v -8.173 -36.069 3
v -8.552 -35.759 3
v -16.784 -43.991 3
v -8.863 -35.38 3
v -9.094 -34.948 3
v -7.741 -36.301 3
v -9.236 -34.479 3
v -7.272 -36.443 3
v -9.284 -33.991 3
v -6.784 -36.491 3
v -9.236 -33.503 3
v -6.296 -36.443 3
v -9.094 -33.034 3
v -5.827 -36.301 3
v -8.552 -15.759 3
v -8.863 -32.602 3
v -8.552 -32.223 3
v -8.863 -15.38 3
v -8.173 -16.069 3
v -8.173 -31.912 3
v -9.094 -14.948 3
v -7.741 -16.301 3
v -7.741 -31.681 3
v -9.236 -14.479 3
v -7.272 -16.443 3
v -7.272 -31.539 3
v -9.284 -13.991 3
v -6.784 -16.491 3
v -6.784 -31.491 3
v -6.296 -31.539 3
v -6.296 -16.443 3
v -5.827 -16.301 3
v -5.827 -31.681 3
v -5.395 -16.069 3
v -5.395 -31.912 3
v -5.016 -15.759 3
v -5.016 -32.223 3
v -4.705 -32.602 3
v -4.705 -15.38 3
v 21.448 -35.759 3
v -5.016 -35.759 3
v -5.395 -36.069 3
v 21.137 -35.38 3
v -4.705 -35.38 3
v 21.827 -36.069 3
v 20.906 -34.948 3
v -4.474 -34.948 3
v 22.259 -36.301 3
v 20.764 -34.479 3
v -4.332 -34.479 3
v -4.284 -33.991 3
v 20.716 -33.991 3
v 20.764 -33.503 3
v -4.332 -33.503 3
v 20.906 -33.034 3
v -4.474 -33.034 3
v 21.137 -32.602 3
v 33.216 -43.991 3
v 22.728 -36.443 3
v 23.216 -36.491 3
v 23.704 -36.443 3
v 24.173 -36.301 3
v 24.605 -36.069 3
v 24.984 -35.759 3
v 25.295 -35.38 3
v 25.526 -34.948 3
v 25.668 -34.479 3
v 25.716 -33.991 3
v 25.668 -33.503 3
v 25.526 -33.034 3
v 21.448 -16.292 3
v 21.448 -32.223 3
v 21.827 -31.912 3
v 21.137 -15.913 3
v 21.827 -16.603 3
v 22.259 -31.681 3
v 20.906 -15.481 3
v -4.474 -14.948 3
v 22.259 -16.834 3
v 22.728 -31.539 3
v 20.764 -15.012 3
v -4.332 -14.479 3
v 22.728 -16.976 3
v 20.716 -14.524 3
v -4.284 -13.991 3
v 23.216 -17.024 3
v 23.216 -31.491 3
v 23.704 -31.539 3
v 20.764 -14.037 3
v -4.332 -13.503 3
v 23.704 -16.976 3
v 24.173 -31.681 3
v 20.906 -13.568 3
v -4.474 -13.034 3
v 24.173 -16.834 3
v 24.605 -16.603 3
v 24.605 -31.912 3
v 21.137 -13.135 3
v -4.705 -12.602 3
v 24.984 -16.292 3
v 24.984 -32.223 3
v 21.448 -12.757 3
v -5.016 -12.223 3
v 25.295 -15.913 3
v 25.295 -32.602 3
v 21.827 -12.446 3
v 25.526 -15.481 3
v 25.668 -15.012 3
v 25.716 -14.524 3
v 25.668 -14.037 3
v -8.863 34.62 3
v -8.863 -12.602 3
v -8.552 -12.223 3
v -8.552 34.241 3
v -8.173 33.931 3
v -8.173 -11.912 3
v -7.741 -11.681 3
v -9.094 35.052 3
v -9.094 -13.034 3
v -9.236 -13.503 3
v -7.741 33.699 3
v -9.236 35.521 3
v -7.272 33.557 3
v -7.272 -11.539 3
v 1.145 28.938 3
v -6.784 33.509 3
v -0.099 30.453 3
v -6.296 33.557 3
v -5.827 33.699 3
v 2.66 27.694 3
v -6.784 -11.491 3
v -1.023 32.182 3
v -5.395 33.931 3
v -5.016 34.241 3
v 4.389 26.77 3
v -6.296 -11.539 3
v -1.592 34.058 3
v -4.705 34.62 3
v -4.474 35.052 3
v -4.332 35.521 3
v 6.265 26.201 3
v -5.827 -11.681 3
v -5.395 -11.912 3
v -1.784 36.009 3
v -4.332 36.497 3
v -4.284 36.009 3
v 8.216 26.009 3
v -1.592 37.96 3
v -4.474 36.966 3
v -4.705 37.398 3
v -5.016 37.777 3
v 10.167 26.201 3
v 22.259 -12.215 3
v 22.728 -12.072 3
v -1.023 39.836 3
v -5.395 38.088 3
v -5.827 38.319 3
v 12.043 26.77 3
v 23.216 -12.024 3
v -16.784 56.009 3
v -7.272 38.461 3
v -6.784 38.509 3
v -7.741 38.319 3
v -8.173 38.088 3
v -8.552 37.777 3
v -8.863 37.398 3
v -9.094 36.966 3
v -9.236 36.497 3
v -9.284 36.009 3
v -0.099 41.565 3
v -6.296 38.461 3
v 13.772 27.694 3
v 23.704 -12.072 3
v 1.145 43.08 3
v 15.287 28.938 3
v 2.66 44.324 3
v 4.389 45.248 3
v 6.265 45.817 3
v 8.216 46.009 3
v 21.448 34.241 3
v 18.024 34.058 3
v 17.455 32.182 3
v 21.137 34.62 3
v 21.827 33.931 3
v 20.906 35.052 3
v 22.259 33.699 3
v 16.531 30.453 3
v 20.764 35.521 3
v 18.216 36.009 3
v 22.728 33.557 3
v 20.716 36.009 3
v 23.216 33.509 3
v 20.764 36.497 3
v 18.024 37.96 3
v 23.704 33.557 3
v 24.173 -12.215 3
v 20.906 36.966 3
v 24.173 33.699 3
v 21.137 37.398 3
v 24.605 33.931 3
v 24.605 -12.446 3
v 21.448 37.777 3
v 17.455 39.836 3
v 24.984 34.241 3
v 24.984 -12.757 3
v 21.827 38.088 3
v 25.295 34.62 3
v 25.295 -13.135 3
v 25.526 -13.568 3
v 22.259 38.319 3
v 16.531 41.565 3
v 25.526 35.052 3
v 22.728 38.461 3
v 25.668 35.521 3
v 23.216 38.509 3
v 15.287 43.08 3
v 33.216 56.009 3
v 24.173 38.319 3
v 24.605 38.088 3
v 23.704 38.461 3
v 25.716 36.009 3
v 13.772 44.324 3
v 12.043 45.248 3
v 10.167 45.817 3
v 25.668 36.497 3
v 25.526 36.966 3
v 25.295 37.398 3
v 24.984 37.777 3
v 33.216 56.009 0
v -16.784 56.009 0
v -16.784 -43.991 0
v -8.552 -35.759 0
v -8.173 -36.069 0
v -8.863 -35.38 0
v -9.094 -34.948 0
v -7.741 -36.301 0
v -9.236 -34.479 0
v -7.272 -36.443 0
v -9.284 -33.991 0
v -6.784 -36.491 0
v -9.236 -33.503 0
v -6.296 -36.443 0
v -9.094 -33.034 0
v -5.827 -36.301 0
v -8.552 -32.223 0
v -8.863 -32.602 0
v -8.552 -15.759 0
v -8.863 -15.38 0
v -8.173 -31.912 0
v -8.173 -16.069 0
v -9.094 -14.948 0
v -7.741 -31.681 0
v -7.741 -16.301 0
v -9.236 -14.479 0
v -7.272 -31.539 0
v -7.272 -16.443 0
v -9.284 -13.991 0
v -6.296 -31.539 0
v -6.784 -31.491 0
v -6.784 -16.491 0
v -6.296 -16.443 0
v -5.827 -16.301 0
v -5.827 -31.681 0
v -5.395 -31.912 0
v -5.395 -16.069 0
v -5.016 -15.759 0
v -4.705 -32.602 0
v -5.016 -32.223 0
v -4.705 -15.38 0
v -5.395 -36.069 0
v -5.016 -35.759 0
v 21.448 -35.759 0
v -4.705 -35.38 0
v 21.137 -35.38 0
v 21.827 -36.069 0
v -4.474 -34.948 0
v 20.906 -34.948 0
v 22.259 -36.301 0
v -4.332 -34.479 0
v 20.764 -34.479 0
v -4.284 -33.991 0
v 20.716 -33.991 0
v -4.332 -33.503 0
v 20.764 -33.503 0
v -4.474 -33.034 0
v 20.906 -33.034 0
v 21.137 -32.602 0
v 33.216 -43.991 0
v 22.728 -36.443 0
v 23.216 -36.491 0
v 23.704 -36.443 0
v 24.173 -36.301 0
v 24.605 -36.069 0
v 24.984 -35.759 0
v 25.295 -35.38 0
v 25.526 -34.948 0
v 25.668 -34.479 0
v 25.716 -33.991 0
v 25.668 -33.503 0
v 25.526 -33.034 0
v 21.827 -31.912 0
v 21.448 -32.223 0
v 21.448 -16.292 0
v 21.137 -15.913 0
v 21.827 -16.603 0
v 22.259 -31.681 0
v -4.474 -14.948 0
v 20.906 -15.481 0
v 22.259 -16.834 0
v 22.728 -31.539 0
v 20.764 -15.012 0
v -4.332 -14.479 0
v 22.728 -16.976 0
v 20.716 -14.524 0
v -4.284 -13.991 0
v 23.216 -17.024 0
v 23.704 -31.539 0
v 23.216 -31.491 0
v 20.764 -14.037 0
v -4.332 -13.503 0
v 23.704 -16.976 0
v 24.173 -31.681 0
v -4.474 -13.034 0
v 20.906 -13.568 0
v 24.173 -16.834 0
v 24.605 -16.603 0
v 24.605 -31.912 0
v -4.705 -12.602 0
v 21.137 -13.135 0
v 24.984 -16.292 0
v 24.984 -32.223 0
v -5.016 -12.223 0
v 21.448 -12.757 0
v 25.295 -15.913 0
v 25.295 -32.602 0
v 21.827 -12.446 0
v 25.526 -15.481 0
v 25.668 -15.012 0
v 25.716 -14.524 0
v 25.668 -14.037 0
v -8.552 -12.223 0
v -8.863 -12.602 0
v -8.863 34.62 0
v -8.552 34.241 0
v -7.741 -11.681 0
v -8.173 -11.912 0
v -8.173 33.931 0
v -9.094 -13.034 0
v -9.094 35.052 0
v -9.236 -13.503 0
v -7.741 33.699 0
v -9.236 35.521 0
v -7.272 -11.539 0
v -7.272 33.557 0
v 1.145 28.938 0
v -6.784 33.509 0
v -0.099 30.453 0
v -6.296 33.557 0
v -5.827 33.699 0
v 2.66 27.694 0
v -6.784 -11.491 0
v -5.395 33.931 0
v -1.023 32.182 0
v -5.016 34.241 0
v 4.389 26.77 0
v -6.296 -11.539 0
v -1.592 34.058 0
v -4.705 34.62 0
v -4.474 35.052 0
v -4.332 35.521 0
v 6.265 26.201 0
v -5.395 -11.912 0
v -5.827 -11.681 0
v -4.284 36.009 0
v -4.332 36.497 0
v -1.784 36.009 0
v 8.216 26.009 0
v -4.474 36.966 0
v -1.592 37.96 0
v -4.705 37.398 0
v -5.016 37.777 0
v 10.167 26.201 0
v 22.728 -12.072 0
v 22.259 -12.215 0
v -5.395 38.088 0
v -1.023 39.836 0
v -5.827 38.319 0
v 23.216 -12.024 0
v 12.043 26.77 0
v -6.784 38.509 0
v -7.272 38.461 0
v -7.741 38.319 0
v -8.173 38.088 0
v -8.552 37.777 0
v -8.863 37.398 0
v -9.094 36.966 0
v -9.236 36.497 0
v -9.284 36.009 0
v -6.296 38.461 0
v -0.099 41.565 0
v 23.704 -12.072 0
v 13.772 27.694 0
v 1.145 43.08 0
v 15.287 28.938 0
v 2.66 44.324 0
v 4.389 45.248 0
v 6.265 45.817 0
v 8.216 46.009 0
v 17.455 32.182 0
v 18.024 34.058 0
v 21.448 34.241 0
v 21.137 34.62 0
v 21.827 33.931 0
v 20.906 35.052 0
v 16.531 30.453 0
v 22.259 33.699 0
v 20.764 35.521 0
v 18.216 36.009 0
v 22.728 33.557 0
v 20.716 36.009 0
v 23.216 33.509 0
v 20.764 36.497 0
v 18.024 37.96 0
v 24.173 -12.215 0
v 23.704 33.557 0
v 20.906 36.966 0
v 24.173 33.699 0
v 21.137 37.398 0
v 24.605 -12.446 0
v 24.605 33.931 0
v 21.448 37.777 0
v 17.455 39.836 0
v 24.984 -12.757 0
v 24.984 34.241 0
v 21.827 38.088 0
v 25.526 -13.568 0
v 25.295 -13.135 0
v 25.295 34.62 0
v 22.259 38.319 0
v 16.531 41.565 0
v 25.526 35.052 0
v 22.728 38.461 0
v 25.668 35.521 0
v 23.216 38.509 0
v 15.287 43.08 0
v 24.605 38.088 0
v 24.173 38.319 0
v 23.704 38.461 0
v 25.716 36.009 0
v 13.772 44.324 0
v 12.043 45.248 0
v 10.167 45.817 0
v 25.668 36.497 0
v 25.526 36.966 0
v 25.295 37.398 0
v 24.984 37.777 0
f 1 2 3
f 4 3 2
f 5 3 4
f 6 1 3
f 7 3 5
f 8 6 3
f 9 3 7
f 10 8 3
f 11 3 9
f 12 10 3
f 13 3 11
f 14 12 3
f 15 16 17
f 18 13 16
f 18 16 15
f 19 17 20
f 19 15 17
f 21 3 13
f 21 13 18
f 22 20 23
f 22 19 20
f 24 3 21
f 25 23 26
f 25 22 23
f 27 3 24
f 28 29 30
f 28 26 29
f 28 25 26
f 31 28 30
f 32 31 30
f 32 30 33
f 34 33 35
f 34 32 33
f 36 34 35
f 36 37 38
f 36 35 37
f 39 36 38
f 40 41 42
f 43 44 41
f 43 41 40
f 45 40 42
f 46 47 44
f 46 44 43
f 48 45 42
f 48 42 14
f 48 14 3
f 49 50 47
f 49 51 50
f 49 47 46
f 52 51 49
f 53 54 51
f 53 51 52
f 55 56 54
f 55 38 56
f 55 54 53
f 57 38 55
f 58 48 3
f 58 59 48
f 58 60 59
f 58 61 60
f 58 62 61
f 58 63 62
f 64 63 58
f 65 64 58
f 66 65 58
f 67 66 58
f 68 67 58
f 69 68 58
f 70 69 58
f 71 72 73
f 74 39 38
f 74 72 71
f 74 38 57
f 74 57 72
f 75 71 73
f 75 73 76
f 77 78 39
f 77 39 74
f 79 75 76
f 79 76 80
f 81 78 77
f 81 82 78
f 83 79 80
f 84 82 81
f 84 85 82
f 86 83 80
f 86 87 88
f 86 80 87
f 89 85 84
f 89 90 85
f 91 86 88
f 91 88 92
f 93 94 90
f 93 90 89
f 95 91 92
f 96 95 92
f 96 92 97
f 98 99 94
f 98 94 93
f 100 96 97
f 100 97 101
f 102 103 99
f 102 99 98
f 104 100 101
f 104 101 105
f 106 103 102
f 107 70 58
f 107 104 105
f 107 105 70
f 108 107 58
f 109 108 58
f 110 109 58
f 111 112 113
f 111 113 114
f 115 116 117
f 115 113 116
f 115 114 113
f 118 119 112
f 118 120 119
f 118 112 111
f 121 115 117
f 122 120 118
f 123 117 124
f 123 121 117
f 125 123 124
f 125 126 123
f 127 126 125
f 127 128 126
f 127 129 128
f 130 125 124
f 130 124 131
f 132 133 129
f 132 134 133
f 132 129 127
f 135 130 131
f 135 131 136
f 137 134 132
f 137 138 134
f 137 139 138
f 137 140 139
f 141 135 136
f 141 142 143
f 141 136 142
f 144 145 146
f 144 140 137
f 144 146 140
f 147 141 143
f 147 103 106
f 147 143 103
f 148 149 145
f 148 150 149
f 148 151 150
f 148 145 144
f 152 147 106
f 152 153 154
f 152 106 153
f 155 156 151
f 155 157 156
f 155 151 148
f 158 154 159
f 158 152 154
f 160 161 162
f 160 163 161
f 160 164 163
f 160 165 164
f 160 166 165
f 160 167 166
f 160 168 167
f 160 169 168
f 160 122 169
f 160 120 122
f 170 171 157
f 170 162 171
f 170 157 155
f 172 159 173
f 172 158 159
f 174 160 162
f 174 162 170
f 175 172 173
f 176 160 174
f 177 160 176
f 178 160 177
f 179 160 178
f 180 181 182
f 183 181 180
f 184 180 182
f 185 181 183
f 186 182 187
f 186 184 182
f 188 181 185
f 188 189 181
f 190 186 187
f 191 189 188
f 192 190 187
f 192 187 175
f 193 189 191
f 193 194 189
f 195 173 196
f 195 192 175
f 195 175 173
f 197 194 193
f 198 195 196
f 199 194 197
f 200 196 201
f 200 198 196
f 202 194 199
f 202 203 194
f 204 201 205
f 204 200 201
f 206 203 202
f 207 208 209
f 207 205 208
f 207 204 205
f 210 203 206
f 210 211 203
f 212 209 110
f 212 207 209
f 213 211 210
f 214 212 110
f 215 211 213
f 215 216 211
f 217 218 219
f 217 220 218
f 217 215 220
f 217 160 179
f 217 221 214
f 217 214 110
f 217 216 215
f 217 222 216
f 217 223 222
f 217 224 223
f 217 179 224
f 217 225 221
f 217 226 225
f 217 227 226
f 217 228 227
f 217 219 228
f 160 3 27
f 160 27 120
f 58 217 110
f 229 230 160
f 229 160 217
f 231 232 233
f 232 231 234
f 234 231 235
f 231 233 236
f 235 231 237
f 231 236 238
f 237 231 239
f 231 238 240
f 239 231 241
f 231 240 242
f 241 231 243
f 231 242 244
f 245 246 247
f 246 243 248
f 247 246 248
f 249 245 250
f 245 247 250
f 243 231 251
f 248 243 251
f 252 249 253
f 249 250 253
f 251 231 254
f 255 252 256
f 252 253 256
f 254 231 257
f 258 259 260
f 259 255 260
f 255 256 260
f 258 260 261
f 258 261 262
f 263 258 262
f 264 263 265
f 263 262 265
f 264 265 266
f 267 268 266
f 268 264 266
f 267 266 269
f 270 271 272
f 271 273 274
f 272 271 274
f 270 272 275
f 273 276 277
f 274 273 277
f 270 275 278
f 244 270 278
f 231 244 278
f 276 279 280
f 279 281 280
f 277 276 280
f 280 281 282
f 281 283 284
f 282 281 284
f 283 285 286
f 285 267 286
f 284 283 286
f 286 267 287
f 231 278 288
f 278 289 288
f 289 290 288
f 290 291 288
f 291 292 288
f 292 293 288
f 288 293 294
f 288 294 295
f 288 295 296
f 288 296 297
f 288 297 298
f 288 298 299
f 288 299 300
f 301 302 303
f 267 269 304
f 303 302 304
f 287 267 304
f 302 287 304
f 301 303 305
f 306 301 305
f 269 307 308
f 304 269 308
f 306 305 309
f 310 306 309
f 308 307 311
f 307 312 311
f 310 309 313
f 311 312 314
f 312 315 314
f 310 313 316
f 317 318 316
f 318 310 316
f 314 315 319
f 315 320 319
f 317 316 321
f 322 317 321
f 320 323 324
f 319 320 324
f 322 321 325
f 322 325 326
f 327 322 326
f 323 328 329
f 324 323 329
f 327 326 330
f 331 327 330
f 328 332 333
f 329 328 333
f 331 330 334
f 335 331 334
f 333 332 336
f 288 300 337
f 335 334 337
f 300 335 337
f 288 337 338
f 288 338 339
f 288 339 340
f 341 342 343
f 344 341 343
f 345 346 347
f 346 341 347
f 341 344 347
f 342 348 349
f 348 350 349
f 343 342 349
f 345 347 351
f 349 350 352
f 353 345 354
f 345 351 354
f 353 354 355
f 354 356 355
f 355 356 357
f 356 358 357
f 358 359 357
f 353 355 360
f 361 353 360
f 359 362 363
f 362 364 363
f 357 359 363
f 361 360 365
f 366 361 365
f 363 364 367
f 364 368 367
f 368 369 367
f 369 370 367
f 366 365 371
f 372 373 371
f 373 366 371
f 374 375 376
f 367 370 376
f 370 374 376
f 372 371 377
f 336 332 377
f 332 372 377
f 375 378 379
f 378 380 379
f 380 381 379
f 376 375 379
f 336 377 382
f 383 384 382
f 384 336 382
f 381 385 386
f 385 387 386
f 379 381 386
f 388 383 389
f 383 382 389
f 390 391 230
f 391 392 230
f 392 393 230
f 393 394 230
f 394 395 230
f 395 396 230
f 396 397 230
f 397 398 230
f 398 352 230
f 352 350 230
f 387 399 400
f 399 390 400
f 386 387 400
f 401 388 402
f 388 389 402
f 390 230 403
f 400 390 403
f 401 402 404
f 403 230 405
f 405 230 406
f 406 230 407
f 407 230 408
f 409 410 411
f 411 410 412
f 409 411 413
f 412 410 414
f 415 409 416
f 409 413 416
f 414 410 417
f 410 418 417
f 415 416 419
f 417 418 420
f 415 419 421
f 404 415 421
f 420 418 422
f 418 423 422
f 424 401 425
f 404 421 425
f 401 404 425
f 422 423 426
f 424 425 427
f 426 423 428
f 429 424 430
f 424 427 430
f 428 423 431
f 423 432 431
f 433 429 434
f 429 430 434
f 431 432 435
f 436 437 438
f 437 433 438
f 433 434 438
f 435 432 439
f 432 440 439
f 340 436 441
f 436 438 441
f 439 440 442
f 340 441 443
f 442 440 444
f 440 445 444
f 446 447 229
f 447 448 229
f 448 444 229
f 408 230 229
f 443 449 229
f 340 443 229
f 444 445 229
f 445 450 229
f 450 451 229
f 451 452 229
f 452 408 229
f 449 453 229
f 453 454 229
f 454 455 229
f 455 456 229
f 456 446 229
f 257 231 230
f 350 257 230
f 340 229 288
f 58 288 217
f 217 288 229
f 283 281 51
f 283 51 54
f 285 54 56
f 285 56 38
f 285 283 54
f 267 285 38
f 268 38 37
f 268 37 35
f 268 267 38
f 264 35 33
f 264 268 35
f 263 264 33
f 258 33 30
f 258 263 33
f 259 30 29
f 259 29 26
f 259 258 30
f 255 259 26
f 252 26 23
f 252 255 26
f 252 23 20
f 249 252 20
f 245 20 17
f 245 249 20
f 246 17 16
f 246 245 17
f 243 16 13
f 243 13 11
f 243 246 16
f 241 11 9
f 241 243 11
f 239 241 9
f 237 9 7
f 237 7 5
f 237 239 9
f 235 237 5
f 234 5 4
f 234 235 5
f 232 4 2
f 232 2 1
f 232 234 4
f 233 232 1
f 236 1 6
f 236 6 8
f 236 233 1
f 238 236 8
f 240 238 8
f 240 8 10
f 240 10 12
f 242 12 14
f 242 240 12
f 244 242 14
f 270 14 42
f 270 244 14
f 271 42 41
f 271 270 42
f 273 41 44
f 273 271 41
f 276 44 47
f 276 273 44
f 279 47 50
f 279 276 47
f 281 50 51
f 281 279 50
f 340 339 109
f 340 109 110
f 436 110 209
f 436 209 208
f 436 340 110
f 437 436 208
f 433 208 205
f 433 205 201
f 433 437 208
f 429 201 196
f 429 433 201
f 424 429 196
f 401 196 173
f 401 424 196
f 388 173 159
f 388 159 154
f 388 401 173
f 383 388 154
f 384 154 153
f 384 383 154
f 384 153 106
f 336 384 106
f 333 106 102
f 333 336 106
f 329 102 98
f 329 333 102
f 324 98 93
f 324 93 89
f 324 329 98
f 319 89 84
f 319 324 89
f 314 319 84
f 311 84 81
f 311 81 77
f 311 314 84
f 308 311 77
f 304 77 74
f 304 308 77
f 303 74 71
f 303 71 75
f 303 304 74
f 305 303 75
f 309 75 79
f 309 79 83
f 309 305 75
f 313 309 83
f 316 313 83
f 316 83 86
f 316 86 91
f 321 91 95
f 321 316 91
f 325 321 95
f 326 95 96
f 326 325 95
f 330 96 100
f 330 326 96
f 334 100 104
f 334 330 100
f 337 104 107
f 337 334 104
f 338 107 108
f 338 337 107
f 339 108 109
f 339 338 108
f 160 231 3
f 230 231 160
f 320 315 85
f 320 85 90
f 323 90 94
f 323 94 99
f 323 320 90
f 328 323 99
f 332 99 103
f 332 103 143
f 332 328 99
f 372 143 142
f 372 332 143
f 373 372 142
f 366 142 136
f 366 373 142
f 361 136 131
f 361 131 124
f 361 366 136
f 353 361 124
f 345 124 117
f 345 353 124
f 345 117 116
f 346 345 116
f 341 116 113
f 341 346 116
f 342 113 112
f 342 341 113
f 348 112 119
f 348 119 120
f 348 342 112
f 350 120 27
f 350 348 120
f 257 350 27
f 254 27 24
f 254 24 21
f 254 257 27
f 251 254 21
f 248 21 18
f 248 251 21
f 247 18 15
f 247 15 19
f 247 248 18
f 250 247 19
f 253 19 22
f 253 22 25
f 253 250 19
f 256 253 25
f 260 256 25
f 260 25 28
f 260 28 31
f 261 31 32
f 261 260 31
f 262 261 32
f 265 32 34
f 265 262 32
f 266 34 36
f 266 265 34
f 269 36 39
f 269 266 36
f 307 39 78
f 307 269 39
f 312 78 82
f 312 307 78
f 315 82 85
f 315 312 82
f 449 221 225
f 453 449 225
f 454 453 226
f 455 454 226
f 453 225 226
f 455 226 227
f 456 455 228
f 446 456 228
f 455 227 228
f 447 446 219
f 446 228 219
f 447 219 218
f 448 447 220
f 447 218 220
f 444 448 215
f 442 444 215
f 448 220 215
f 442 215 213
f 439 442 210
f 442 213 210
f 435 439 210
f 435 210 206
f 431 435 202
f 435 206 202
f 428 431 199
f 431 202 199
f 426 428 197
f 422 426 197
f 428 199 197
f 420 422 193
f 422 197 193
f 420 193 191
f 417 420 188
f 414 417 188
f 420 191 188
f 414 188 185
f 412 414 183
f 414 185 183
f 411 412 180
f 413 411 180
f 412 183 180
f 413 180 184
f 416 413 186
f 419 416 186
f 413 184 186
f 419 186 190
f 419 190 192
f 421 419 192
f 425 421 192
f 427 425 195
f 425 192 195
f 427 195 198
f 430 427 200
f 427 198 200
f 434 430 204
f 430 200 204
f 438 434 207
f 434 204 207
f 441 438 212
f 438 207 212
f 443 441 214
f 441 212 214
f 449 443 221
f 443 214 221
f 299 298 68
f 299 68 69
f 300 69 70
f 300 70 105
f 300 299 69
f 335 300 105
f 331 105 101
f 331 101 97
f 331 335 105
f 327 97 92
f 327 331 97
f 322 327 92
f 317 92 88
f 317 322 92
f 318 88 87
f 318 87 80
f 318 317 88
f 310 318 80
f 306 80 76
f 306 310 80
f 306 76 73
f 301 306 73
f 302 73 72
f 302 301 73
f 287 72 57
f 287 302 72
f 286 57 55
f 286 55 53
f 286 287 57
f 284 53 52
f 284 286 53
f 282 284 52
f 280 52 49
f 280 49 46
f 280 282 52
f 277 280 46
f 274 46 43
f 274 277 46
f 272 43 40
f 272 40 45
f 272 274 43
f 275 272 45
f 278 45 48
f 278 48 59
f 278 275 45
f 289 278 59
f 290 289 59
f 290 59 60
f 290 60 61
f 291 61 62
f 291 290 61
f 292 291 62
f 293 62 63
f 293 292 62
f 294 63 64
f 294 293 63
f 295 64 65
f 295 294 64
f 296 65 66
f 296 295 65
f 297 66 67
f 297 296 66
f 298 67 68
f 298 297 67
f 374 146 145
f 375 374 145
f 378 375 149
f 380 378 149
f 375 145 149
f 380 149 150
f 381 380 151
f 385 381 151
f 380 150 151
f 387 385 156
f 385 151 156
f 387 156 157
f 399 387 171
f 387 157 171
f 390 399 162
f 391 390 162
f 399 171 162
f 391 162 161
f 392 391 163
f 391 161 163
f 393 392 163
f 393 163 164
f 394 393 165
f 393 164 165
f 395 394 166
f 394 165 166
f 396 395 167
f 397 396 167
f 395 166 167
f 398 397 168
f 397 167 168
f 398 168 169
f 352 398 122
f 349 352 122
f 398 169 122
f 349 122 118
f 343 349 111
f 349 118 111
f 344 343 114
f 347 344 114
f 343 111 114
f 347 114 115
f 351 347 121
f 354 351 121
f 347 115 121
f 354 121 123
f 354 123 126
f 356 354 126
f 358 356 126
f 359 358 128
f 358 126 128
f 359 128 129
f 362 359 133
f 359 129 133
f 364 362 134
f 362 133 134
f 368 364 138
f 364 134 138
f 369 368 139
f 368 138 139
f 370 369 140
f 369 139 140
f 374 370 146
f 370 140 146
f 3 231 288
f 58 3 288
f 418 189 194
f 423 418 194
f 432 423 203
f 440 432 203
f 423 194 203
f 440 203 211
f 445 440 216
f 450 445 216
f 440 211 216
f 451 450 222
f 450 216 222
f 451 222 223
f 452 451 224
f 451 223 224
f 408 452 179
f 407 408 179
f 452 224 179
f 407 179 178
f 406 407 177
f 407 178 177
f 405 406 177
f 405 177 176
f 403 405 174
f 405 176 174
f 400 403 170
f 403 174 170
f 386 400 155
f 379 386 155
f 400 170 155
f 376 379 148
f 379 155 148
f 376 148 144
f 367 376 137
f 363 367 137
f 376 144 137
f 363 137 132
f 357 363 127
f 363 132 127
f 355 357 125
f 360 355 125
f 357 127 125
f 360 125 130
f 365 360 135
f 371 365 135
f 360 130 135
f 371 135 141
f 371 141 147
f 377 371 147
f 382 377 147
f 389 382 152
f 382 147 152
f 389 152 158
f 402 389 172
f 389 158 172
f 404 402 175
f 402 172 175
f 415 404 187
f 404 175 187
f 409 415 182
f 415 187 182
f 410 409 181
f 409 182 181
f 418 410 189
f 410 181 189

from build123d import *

# Parameters (mm, degrees)
SZKIC1_W                    = 50
SZKIC1_H                    = 100
SZKIC1_R                    = 2.5
DODANIE_WYCI_GNI_CIE1_DEPTH = 3
SZKIC2_R                    = 10
SZKIC2_R_2                  = 2.5
WYTNIJ_WYCI_GNI_CIE1_DEPTH  = 3


with BuildPart() as part:
    # Szkic1 → Dodanie-wyciągnięcie1 (new body)
    with BuildSketch(Plane.XY):
        with Locations((8.216170281, 6.009174312)):
            Rectangle(SZKIC1_W, SZKIC1_H)
        with Locations((23.216170281, -33.990825688)):
            Circle(SZKIC1_R, mode=Mode.SUBTRACT)
        with Locations((-6.783829719, -33.990825688)):
            Circle(SZKIC1_R, mode=Mode.SUBTRACT)
        with Locations((23.216170281, -14.524318973)):
            Circle(SZKIC1_R, mode=Mode.SUBTRACT)
        with Locations((-6.783829719, -13.990825688)):
            Circle(SZKIC1_R, mode=Mode.SUBTRACT)
    extrude(amount=DODANIE_WYCI_GNI_CIE1_DEPTH)

    # Szkic2 → Wytnij-wyciągnięcie1 (cut)
    with BuildSketch(Plane.XY.offset(3)):
        with Locations((8.216170281, 36.009174312)):
            Circle(SZKIC2_R)
        with Locations((-6.783829719, 36.009174312)):
            Circle(SZKIC2_R_2)
        with Locations((23.216170281, 36.009174312)):
            Circle(SZKIC2_R_2)
    extrude(amount=-WYTNIJ_WYCI_GNI_CIE1_DEPTH, mode=Mode.SUBTRACT)


solid = part.part
